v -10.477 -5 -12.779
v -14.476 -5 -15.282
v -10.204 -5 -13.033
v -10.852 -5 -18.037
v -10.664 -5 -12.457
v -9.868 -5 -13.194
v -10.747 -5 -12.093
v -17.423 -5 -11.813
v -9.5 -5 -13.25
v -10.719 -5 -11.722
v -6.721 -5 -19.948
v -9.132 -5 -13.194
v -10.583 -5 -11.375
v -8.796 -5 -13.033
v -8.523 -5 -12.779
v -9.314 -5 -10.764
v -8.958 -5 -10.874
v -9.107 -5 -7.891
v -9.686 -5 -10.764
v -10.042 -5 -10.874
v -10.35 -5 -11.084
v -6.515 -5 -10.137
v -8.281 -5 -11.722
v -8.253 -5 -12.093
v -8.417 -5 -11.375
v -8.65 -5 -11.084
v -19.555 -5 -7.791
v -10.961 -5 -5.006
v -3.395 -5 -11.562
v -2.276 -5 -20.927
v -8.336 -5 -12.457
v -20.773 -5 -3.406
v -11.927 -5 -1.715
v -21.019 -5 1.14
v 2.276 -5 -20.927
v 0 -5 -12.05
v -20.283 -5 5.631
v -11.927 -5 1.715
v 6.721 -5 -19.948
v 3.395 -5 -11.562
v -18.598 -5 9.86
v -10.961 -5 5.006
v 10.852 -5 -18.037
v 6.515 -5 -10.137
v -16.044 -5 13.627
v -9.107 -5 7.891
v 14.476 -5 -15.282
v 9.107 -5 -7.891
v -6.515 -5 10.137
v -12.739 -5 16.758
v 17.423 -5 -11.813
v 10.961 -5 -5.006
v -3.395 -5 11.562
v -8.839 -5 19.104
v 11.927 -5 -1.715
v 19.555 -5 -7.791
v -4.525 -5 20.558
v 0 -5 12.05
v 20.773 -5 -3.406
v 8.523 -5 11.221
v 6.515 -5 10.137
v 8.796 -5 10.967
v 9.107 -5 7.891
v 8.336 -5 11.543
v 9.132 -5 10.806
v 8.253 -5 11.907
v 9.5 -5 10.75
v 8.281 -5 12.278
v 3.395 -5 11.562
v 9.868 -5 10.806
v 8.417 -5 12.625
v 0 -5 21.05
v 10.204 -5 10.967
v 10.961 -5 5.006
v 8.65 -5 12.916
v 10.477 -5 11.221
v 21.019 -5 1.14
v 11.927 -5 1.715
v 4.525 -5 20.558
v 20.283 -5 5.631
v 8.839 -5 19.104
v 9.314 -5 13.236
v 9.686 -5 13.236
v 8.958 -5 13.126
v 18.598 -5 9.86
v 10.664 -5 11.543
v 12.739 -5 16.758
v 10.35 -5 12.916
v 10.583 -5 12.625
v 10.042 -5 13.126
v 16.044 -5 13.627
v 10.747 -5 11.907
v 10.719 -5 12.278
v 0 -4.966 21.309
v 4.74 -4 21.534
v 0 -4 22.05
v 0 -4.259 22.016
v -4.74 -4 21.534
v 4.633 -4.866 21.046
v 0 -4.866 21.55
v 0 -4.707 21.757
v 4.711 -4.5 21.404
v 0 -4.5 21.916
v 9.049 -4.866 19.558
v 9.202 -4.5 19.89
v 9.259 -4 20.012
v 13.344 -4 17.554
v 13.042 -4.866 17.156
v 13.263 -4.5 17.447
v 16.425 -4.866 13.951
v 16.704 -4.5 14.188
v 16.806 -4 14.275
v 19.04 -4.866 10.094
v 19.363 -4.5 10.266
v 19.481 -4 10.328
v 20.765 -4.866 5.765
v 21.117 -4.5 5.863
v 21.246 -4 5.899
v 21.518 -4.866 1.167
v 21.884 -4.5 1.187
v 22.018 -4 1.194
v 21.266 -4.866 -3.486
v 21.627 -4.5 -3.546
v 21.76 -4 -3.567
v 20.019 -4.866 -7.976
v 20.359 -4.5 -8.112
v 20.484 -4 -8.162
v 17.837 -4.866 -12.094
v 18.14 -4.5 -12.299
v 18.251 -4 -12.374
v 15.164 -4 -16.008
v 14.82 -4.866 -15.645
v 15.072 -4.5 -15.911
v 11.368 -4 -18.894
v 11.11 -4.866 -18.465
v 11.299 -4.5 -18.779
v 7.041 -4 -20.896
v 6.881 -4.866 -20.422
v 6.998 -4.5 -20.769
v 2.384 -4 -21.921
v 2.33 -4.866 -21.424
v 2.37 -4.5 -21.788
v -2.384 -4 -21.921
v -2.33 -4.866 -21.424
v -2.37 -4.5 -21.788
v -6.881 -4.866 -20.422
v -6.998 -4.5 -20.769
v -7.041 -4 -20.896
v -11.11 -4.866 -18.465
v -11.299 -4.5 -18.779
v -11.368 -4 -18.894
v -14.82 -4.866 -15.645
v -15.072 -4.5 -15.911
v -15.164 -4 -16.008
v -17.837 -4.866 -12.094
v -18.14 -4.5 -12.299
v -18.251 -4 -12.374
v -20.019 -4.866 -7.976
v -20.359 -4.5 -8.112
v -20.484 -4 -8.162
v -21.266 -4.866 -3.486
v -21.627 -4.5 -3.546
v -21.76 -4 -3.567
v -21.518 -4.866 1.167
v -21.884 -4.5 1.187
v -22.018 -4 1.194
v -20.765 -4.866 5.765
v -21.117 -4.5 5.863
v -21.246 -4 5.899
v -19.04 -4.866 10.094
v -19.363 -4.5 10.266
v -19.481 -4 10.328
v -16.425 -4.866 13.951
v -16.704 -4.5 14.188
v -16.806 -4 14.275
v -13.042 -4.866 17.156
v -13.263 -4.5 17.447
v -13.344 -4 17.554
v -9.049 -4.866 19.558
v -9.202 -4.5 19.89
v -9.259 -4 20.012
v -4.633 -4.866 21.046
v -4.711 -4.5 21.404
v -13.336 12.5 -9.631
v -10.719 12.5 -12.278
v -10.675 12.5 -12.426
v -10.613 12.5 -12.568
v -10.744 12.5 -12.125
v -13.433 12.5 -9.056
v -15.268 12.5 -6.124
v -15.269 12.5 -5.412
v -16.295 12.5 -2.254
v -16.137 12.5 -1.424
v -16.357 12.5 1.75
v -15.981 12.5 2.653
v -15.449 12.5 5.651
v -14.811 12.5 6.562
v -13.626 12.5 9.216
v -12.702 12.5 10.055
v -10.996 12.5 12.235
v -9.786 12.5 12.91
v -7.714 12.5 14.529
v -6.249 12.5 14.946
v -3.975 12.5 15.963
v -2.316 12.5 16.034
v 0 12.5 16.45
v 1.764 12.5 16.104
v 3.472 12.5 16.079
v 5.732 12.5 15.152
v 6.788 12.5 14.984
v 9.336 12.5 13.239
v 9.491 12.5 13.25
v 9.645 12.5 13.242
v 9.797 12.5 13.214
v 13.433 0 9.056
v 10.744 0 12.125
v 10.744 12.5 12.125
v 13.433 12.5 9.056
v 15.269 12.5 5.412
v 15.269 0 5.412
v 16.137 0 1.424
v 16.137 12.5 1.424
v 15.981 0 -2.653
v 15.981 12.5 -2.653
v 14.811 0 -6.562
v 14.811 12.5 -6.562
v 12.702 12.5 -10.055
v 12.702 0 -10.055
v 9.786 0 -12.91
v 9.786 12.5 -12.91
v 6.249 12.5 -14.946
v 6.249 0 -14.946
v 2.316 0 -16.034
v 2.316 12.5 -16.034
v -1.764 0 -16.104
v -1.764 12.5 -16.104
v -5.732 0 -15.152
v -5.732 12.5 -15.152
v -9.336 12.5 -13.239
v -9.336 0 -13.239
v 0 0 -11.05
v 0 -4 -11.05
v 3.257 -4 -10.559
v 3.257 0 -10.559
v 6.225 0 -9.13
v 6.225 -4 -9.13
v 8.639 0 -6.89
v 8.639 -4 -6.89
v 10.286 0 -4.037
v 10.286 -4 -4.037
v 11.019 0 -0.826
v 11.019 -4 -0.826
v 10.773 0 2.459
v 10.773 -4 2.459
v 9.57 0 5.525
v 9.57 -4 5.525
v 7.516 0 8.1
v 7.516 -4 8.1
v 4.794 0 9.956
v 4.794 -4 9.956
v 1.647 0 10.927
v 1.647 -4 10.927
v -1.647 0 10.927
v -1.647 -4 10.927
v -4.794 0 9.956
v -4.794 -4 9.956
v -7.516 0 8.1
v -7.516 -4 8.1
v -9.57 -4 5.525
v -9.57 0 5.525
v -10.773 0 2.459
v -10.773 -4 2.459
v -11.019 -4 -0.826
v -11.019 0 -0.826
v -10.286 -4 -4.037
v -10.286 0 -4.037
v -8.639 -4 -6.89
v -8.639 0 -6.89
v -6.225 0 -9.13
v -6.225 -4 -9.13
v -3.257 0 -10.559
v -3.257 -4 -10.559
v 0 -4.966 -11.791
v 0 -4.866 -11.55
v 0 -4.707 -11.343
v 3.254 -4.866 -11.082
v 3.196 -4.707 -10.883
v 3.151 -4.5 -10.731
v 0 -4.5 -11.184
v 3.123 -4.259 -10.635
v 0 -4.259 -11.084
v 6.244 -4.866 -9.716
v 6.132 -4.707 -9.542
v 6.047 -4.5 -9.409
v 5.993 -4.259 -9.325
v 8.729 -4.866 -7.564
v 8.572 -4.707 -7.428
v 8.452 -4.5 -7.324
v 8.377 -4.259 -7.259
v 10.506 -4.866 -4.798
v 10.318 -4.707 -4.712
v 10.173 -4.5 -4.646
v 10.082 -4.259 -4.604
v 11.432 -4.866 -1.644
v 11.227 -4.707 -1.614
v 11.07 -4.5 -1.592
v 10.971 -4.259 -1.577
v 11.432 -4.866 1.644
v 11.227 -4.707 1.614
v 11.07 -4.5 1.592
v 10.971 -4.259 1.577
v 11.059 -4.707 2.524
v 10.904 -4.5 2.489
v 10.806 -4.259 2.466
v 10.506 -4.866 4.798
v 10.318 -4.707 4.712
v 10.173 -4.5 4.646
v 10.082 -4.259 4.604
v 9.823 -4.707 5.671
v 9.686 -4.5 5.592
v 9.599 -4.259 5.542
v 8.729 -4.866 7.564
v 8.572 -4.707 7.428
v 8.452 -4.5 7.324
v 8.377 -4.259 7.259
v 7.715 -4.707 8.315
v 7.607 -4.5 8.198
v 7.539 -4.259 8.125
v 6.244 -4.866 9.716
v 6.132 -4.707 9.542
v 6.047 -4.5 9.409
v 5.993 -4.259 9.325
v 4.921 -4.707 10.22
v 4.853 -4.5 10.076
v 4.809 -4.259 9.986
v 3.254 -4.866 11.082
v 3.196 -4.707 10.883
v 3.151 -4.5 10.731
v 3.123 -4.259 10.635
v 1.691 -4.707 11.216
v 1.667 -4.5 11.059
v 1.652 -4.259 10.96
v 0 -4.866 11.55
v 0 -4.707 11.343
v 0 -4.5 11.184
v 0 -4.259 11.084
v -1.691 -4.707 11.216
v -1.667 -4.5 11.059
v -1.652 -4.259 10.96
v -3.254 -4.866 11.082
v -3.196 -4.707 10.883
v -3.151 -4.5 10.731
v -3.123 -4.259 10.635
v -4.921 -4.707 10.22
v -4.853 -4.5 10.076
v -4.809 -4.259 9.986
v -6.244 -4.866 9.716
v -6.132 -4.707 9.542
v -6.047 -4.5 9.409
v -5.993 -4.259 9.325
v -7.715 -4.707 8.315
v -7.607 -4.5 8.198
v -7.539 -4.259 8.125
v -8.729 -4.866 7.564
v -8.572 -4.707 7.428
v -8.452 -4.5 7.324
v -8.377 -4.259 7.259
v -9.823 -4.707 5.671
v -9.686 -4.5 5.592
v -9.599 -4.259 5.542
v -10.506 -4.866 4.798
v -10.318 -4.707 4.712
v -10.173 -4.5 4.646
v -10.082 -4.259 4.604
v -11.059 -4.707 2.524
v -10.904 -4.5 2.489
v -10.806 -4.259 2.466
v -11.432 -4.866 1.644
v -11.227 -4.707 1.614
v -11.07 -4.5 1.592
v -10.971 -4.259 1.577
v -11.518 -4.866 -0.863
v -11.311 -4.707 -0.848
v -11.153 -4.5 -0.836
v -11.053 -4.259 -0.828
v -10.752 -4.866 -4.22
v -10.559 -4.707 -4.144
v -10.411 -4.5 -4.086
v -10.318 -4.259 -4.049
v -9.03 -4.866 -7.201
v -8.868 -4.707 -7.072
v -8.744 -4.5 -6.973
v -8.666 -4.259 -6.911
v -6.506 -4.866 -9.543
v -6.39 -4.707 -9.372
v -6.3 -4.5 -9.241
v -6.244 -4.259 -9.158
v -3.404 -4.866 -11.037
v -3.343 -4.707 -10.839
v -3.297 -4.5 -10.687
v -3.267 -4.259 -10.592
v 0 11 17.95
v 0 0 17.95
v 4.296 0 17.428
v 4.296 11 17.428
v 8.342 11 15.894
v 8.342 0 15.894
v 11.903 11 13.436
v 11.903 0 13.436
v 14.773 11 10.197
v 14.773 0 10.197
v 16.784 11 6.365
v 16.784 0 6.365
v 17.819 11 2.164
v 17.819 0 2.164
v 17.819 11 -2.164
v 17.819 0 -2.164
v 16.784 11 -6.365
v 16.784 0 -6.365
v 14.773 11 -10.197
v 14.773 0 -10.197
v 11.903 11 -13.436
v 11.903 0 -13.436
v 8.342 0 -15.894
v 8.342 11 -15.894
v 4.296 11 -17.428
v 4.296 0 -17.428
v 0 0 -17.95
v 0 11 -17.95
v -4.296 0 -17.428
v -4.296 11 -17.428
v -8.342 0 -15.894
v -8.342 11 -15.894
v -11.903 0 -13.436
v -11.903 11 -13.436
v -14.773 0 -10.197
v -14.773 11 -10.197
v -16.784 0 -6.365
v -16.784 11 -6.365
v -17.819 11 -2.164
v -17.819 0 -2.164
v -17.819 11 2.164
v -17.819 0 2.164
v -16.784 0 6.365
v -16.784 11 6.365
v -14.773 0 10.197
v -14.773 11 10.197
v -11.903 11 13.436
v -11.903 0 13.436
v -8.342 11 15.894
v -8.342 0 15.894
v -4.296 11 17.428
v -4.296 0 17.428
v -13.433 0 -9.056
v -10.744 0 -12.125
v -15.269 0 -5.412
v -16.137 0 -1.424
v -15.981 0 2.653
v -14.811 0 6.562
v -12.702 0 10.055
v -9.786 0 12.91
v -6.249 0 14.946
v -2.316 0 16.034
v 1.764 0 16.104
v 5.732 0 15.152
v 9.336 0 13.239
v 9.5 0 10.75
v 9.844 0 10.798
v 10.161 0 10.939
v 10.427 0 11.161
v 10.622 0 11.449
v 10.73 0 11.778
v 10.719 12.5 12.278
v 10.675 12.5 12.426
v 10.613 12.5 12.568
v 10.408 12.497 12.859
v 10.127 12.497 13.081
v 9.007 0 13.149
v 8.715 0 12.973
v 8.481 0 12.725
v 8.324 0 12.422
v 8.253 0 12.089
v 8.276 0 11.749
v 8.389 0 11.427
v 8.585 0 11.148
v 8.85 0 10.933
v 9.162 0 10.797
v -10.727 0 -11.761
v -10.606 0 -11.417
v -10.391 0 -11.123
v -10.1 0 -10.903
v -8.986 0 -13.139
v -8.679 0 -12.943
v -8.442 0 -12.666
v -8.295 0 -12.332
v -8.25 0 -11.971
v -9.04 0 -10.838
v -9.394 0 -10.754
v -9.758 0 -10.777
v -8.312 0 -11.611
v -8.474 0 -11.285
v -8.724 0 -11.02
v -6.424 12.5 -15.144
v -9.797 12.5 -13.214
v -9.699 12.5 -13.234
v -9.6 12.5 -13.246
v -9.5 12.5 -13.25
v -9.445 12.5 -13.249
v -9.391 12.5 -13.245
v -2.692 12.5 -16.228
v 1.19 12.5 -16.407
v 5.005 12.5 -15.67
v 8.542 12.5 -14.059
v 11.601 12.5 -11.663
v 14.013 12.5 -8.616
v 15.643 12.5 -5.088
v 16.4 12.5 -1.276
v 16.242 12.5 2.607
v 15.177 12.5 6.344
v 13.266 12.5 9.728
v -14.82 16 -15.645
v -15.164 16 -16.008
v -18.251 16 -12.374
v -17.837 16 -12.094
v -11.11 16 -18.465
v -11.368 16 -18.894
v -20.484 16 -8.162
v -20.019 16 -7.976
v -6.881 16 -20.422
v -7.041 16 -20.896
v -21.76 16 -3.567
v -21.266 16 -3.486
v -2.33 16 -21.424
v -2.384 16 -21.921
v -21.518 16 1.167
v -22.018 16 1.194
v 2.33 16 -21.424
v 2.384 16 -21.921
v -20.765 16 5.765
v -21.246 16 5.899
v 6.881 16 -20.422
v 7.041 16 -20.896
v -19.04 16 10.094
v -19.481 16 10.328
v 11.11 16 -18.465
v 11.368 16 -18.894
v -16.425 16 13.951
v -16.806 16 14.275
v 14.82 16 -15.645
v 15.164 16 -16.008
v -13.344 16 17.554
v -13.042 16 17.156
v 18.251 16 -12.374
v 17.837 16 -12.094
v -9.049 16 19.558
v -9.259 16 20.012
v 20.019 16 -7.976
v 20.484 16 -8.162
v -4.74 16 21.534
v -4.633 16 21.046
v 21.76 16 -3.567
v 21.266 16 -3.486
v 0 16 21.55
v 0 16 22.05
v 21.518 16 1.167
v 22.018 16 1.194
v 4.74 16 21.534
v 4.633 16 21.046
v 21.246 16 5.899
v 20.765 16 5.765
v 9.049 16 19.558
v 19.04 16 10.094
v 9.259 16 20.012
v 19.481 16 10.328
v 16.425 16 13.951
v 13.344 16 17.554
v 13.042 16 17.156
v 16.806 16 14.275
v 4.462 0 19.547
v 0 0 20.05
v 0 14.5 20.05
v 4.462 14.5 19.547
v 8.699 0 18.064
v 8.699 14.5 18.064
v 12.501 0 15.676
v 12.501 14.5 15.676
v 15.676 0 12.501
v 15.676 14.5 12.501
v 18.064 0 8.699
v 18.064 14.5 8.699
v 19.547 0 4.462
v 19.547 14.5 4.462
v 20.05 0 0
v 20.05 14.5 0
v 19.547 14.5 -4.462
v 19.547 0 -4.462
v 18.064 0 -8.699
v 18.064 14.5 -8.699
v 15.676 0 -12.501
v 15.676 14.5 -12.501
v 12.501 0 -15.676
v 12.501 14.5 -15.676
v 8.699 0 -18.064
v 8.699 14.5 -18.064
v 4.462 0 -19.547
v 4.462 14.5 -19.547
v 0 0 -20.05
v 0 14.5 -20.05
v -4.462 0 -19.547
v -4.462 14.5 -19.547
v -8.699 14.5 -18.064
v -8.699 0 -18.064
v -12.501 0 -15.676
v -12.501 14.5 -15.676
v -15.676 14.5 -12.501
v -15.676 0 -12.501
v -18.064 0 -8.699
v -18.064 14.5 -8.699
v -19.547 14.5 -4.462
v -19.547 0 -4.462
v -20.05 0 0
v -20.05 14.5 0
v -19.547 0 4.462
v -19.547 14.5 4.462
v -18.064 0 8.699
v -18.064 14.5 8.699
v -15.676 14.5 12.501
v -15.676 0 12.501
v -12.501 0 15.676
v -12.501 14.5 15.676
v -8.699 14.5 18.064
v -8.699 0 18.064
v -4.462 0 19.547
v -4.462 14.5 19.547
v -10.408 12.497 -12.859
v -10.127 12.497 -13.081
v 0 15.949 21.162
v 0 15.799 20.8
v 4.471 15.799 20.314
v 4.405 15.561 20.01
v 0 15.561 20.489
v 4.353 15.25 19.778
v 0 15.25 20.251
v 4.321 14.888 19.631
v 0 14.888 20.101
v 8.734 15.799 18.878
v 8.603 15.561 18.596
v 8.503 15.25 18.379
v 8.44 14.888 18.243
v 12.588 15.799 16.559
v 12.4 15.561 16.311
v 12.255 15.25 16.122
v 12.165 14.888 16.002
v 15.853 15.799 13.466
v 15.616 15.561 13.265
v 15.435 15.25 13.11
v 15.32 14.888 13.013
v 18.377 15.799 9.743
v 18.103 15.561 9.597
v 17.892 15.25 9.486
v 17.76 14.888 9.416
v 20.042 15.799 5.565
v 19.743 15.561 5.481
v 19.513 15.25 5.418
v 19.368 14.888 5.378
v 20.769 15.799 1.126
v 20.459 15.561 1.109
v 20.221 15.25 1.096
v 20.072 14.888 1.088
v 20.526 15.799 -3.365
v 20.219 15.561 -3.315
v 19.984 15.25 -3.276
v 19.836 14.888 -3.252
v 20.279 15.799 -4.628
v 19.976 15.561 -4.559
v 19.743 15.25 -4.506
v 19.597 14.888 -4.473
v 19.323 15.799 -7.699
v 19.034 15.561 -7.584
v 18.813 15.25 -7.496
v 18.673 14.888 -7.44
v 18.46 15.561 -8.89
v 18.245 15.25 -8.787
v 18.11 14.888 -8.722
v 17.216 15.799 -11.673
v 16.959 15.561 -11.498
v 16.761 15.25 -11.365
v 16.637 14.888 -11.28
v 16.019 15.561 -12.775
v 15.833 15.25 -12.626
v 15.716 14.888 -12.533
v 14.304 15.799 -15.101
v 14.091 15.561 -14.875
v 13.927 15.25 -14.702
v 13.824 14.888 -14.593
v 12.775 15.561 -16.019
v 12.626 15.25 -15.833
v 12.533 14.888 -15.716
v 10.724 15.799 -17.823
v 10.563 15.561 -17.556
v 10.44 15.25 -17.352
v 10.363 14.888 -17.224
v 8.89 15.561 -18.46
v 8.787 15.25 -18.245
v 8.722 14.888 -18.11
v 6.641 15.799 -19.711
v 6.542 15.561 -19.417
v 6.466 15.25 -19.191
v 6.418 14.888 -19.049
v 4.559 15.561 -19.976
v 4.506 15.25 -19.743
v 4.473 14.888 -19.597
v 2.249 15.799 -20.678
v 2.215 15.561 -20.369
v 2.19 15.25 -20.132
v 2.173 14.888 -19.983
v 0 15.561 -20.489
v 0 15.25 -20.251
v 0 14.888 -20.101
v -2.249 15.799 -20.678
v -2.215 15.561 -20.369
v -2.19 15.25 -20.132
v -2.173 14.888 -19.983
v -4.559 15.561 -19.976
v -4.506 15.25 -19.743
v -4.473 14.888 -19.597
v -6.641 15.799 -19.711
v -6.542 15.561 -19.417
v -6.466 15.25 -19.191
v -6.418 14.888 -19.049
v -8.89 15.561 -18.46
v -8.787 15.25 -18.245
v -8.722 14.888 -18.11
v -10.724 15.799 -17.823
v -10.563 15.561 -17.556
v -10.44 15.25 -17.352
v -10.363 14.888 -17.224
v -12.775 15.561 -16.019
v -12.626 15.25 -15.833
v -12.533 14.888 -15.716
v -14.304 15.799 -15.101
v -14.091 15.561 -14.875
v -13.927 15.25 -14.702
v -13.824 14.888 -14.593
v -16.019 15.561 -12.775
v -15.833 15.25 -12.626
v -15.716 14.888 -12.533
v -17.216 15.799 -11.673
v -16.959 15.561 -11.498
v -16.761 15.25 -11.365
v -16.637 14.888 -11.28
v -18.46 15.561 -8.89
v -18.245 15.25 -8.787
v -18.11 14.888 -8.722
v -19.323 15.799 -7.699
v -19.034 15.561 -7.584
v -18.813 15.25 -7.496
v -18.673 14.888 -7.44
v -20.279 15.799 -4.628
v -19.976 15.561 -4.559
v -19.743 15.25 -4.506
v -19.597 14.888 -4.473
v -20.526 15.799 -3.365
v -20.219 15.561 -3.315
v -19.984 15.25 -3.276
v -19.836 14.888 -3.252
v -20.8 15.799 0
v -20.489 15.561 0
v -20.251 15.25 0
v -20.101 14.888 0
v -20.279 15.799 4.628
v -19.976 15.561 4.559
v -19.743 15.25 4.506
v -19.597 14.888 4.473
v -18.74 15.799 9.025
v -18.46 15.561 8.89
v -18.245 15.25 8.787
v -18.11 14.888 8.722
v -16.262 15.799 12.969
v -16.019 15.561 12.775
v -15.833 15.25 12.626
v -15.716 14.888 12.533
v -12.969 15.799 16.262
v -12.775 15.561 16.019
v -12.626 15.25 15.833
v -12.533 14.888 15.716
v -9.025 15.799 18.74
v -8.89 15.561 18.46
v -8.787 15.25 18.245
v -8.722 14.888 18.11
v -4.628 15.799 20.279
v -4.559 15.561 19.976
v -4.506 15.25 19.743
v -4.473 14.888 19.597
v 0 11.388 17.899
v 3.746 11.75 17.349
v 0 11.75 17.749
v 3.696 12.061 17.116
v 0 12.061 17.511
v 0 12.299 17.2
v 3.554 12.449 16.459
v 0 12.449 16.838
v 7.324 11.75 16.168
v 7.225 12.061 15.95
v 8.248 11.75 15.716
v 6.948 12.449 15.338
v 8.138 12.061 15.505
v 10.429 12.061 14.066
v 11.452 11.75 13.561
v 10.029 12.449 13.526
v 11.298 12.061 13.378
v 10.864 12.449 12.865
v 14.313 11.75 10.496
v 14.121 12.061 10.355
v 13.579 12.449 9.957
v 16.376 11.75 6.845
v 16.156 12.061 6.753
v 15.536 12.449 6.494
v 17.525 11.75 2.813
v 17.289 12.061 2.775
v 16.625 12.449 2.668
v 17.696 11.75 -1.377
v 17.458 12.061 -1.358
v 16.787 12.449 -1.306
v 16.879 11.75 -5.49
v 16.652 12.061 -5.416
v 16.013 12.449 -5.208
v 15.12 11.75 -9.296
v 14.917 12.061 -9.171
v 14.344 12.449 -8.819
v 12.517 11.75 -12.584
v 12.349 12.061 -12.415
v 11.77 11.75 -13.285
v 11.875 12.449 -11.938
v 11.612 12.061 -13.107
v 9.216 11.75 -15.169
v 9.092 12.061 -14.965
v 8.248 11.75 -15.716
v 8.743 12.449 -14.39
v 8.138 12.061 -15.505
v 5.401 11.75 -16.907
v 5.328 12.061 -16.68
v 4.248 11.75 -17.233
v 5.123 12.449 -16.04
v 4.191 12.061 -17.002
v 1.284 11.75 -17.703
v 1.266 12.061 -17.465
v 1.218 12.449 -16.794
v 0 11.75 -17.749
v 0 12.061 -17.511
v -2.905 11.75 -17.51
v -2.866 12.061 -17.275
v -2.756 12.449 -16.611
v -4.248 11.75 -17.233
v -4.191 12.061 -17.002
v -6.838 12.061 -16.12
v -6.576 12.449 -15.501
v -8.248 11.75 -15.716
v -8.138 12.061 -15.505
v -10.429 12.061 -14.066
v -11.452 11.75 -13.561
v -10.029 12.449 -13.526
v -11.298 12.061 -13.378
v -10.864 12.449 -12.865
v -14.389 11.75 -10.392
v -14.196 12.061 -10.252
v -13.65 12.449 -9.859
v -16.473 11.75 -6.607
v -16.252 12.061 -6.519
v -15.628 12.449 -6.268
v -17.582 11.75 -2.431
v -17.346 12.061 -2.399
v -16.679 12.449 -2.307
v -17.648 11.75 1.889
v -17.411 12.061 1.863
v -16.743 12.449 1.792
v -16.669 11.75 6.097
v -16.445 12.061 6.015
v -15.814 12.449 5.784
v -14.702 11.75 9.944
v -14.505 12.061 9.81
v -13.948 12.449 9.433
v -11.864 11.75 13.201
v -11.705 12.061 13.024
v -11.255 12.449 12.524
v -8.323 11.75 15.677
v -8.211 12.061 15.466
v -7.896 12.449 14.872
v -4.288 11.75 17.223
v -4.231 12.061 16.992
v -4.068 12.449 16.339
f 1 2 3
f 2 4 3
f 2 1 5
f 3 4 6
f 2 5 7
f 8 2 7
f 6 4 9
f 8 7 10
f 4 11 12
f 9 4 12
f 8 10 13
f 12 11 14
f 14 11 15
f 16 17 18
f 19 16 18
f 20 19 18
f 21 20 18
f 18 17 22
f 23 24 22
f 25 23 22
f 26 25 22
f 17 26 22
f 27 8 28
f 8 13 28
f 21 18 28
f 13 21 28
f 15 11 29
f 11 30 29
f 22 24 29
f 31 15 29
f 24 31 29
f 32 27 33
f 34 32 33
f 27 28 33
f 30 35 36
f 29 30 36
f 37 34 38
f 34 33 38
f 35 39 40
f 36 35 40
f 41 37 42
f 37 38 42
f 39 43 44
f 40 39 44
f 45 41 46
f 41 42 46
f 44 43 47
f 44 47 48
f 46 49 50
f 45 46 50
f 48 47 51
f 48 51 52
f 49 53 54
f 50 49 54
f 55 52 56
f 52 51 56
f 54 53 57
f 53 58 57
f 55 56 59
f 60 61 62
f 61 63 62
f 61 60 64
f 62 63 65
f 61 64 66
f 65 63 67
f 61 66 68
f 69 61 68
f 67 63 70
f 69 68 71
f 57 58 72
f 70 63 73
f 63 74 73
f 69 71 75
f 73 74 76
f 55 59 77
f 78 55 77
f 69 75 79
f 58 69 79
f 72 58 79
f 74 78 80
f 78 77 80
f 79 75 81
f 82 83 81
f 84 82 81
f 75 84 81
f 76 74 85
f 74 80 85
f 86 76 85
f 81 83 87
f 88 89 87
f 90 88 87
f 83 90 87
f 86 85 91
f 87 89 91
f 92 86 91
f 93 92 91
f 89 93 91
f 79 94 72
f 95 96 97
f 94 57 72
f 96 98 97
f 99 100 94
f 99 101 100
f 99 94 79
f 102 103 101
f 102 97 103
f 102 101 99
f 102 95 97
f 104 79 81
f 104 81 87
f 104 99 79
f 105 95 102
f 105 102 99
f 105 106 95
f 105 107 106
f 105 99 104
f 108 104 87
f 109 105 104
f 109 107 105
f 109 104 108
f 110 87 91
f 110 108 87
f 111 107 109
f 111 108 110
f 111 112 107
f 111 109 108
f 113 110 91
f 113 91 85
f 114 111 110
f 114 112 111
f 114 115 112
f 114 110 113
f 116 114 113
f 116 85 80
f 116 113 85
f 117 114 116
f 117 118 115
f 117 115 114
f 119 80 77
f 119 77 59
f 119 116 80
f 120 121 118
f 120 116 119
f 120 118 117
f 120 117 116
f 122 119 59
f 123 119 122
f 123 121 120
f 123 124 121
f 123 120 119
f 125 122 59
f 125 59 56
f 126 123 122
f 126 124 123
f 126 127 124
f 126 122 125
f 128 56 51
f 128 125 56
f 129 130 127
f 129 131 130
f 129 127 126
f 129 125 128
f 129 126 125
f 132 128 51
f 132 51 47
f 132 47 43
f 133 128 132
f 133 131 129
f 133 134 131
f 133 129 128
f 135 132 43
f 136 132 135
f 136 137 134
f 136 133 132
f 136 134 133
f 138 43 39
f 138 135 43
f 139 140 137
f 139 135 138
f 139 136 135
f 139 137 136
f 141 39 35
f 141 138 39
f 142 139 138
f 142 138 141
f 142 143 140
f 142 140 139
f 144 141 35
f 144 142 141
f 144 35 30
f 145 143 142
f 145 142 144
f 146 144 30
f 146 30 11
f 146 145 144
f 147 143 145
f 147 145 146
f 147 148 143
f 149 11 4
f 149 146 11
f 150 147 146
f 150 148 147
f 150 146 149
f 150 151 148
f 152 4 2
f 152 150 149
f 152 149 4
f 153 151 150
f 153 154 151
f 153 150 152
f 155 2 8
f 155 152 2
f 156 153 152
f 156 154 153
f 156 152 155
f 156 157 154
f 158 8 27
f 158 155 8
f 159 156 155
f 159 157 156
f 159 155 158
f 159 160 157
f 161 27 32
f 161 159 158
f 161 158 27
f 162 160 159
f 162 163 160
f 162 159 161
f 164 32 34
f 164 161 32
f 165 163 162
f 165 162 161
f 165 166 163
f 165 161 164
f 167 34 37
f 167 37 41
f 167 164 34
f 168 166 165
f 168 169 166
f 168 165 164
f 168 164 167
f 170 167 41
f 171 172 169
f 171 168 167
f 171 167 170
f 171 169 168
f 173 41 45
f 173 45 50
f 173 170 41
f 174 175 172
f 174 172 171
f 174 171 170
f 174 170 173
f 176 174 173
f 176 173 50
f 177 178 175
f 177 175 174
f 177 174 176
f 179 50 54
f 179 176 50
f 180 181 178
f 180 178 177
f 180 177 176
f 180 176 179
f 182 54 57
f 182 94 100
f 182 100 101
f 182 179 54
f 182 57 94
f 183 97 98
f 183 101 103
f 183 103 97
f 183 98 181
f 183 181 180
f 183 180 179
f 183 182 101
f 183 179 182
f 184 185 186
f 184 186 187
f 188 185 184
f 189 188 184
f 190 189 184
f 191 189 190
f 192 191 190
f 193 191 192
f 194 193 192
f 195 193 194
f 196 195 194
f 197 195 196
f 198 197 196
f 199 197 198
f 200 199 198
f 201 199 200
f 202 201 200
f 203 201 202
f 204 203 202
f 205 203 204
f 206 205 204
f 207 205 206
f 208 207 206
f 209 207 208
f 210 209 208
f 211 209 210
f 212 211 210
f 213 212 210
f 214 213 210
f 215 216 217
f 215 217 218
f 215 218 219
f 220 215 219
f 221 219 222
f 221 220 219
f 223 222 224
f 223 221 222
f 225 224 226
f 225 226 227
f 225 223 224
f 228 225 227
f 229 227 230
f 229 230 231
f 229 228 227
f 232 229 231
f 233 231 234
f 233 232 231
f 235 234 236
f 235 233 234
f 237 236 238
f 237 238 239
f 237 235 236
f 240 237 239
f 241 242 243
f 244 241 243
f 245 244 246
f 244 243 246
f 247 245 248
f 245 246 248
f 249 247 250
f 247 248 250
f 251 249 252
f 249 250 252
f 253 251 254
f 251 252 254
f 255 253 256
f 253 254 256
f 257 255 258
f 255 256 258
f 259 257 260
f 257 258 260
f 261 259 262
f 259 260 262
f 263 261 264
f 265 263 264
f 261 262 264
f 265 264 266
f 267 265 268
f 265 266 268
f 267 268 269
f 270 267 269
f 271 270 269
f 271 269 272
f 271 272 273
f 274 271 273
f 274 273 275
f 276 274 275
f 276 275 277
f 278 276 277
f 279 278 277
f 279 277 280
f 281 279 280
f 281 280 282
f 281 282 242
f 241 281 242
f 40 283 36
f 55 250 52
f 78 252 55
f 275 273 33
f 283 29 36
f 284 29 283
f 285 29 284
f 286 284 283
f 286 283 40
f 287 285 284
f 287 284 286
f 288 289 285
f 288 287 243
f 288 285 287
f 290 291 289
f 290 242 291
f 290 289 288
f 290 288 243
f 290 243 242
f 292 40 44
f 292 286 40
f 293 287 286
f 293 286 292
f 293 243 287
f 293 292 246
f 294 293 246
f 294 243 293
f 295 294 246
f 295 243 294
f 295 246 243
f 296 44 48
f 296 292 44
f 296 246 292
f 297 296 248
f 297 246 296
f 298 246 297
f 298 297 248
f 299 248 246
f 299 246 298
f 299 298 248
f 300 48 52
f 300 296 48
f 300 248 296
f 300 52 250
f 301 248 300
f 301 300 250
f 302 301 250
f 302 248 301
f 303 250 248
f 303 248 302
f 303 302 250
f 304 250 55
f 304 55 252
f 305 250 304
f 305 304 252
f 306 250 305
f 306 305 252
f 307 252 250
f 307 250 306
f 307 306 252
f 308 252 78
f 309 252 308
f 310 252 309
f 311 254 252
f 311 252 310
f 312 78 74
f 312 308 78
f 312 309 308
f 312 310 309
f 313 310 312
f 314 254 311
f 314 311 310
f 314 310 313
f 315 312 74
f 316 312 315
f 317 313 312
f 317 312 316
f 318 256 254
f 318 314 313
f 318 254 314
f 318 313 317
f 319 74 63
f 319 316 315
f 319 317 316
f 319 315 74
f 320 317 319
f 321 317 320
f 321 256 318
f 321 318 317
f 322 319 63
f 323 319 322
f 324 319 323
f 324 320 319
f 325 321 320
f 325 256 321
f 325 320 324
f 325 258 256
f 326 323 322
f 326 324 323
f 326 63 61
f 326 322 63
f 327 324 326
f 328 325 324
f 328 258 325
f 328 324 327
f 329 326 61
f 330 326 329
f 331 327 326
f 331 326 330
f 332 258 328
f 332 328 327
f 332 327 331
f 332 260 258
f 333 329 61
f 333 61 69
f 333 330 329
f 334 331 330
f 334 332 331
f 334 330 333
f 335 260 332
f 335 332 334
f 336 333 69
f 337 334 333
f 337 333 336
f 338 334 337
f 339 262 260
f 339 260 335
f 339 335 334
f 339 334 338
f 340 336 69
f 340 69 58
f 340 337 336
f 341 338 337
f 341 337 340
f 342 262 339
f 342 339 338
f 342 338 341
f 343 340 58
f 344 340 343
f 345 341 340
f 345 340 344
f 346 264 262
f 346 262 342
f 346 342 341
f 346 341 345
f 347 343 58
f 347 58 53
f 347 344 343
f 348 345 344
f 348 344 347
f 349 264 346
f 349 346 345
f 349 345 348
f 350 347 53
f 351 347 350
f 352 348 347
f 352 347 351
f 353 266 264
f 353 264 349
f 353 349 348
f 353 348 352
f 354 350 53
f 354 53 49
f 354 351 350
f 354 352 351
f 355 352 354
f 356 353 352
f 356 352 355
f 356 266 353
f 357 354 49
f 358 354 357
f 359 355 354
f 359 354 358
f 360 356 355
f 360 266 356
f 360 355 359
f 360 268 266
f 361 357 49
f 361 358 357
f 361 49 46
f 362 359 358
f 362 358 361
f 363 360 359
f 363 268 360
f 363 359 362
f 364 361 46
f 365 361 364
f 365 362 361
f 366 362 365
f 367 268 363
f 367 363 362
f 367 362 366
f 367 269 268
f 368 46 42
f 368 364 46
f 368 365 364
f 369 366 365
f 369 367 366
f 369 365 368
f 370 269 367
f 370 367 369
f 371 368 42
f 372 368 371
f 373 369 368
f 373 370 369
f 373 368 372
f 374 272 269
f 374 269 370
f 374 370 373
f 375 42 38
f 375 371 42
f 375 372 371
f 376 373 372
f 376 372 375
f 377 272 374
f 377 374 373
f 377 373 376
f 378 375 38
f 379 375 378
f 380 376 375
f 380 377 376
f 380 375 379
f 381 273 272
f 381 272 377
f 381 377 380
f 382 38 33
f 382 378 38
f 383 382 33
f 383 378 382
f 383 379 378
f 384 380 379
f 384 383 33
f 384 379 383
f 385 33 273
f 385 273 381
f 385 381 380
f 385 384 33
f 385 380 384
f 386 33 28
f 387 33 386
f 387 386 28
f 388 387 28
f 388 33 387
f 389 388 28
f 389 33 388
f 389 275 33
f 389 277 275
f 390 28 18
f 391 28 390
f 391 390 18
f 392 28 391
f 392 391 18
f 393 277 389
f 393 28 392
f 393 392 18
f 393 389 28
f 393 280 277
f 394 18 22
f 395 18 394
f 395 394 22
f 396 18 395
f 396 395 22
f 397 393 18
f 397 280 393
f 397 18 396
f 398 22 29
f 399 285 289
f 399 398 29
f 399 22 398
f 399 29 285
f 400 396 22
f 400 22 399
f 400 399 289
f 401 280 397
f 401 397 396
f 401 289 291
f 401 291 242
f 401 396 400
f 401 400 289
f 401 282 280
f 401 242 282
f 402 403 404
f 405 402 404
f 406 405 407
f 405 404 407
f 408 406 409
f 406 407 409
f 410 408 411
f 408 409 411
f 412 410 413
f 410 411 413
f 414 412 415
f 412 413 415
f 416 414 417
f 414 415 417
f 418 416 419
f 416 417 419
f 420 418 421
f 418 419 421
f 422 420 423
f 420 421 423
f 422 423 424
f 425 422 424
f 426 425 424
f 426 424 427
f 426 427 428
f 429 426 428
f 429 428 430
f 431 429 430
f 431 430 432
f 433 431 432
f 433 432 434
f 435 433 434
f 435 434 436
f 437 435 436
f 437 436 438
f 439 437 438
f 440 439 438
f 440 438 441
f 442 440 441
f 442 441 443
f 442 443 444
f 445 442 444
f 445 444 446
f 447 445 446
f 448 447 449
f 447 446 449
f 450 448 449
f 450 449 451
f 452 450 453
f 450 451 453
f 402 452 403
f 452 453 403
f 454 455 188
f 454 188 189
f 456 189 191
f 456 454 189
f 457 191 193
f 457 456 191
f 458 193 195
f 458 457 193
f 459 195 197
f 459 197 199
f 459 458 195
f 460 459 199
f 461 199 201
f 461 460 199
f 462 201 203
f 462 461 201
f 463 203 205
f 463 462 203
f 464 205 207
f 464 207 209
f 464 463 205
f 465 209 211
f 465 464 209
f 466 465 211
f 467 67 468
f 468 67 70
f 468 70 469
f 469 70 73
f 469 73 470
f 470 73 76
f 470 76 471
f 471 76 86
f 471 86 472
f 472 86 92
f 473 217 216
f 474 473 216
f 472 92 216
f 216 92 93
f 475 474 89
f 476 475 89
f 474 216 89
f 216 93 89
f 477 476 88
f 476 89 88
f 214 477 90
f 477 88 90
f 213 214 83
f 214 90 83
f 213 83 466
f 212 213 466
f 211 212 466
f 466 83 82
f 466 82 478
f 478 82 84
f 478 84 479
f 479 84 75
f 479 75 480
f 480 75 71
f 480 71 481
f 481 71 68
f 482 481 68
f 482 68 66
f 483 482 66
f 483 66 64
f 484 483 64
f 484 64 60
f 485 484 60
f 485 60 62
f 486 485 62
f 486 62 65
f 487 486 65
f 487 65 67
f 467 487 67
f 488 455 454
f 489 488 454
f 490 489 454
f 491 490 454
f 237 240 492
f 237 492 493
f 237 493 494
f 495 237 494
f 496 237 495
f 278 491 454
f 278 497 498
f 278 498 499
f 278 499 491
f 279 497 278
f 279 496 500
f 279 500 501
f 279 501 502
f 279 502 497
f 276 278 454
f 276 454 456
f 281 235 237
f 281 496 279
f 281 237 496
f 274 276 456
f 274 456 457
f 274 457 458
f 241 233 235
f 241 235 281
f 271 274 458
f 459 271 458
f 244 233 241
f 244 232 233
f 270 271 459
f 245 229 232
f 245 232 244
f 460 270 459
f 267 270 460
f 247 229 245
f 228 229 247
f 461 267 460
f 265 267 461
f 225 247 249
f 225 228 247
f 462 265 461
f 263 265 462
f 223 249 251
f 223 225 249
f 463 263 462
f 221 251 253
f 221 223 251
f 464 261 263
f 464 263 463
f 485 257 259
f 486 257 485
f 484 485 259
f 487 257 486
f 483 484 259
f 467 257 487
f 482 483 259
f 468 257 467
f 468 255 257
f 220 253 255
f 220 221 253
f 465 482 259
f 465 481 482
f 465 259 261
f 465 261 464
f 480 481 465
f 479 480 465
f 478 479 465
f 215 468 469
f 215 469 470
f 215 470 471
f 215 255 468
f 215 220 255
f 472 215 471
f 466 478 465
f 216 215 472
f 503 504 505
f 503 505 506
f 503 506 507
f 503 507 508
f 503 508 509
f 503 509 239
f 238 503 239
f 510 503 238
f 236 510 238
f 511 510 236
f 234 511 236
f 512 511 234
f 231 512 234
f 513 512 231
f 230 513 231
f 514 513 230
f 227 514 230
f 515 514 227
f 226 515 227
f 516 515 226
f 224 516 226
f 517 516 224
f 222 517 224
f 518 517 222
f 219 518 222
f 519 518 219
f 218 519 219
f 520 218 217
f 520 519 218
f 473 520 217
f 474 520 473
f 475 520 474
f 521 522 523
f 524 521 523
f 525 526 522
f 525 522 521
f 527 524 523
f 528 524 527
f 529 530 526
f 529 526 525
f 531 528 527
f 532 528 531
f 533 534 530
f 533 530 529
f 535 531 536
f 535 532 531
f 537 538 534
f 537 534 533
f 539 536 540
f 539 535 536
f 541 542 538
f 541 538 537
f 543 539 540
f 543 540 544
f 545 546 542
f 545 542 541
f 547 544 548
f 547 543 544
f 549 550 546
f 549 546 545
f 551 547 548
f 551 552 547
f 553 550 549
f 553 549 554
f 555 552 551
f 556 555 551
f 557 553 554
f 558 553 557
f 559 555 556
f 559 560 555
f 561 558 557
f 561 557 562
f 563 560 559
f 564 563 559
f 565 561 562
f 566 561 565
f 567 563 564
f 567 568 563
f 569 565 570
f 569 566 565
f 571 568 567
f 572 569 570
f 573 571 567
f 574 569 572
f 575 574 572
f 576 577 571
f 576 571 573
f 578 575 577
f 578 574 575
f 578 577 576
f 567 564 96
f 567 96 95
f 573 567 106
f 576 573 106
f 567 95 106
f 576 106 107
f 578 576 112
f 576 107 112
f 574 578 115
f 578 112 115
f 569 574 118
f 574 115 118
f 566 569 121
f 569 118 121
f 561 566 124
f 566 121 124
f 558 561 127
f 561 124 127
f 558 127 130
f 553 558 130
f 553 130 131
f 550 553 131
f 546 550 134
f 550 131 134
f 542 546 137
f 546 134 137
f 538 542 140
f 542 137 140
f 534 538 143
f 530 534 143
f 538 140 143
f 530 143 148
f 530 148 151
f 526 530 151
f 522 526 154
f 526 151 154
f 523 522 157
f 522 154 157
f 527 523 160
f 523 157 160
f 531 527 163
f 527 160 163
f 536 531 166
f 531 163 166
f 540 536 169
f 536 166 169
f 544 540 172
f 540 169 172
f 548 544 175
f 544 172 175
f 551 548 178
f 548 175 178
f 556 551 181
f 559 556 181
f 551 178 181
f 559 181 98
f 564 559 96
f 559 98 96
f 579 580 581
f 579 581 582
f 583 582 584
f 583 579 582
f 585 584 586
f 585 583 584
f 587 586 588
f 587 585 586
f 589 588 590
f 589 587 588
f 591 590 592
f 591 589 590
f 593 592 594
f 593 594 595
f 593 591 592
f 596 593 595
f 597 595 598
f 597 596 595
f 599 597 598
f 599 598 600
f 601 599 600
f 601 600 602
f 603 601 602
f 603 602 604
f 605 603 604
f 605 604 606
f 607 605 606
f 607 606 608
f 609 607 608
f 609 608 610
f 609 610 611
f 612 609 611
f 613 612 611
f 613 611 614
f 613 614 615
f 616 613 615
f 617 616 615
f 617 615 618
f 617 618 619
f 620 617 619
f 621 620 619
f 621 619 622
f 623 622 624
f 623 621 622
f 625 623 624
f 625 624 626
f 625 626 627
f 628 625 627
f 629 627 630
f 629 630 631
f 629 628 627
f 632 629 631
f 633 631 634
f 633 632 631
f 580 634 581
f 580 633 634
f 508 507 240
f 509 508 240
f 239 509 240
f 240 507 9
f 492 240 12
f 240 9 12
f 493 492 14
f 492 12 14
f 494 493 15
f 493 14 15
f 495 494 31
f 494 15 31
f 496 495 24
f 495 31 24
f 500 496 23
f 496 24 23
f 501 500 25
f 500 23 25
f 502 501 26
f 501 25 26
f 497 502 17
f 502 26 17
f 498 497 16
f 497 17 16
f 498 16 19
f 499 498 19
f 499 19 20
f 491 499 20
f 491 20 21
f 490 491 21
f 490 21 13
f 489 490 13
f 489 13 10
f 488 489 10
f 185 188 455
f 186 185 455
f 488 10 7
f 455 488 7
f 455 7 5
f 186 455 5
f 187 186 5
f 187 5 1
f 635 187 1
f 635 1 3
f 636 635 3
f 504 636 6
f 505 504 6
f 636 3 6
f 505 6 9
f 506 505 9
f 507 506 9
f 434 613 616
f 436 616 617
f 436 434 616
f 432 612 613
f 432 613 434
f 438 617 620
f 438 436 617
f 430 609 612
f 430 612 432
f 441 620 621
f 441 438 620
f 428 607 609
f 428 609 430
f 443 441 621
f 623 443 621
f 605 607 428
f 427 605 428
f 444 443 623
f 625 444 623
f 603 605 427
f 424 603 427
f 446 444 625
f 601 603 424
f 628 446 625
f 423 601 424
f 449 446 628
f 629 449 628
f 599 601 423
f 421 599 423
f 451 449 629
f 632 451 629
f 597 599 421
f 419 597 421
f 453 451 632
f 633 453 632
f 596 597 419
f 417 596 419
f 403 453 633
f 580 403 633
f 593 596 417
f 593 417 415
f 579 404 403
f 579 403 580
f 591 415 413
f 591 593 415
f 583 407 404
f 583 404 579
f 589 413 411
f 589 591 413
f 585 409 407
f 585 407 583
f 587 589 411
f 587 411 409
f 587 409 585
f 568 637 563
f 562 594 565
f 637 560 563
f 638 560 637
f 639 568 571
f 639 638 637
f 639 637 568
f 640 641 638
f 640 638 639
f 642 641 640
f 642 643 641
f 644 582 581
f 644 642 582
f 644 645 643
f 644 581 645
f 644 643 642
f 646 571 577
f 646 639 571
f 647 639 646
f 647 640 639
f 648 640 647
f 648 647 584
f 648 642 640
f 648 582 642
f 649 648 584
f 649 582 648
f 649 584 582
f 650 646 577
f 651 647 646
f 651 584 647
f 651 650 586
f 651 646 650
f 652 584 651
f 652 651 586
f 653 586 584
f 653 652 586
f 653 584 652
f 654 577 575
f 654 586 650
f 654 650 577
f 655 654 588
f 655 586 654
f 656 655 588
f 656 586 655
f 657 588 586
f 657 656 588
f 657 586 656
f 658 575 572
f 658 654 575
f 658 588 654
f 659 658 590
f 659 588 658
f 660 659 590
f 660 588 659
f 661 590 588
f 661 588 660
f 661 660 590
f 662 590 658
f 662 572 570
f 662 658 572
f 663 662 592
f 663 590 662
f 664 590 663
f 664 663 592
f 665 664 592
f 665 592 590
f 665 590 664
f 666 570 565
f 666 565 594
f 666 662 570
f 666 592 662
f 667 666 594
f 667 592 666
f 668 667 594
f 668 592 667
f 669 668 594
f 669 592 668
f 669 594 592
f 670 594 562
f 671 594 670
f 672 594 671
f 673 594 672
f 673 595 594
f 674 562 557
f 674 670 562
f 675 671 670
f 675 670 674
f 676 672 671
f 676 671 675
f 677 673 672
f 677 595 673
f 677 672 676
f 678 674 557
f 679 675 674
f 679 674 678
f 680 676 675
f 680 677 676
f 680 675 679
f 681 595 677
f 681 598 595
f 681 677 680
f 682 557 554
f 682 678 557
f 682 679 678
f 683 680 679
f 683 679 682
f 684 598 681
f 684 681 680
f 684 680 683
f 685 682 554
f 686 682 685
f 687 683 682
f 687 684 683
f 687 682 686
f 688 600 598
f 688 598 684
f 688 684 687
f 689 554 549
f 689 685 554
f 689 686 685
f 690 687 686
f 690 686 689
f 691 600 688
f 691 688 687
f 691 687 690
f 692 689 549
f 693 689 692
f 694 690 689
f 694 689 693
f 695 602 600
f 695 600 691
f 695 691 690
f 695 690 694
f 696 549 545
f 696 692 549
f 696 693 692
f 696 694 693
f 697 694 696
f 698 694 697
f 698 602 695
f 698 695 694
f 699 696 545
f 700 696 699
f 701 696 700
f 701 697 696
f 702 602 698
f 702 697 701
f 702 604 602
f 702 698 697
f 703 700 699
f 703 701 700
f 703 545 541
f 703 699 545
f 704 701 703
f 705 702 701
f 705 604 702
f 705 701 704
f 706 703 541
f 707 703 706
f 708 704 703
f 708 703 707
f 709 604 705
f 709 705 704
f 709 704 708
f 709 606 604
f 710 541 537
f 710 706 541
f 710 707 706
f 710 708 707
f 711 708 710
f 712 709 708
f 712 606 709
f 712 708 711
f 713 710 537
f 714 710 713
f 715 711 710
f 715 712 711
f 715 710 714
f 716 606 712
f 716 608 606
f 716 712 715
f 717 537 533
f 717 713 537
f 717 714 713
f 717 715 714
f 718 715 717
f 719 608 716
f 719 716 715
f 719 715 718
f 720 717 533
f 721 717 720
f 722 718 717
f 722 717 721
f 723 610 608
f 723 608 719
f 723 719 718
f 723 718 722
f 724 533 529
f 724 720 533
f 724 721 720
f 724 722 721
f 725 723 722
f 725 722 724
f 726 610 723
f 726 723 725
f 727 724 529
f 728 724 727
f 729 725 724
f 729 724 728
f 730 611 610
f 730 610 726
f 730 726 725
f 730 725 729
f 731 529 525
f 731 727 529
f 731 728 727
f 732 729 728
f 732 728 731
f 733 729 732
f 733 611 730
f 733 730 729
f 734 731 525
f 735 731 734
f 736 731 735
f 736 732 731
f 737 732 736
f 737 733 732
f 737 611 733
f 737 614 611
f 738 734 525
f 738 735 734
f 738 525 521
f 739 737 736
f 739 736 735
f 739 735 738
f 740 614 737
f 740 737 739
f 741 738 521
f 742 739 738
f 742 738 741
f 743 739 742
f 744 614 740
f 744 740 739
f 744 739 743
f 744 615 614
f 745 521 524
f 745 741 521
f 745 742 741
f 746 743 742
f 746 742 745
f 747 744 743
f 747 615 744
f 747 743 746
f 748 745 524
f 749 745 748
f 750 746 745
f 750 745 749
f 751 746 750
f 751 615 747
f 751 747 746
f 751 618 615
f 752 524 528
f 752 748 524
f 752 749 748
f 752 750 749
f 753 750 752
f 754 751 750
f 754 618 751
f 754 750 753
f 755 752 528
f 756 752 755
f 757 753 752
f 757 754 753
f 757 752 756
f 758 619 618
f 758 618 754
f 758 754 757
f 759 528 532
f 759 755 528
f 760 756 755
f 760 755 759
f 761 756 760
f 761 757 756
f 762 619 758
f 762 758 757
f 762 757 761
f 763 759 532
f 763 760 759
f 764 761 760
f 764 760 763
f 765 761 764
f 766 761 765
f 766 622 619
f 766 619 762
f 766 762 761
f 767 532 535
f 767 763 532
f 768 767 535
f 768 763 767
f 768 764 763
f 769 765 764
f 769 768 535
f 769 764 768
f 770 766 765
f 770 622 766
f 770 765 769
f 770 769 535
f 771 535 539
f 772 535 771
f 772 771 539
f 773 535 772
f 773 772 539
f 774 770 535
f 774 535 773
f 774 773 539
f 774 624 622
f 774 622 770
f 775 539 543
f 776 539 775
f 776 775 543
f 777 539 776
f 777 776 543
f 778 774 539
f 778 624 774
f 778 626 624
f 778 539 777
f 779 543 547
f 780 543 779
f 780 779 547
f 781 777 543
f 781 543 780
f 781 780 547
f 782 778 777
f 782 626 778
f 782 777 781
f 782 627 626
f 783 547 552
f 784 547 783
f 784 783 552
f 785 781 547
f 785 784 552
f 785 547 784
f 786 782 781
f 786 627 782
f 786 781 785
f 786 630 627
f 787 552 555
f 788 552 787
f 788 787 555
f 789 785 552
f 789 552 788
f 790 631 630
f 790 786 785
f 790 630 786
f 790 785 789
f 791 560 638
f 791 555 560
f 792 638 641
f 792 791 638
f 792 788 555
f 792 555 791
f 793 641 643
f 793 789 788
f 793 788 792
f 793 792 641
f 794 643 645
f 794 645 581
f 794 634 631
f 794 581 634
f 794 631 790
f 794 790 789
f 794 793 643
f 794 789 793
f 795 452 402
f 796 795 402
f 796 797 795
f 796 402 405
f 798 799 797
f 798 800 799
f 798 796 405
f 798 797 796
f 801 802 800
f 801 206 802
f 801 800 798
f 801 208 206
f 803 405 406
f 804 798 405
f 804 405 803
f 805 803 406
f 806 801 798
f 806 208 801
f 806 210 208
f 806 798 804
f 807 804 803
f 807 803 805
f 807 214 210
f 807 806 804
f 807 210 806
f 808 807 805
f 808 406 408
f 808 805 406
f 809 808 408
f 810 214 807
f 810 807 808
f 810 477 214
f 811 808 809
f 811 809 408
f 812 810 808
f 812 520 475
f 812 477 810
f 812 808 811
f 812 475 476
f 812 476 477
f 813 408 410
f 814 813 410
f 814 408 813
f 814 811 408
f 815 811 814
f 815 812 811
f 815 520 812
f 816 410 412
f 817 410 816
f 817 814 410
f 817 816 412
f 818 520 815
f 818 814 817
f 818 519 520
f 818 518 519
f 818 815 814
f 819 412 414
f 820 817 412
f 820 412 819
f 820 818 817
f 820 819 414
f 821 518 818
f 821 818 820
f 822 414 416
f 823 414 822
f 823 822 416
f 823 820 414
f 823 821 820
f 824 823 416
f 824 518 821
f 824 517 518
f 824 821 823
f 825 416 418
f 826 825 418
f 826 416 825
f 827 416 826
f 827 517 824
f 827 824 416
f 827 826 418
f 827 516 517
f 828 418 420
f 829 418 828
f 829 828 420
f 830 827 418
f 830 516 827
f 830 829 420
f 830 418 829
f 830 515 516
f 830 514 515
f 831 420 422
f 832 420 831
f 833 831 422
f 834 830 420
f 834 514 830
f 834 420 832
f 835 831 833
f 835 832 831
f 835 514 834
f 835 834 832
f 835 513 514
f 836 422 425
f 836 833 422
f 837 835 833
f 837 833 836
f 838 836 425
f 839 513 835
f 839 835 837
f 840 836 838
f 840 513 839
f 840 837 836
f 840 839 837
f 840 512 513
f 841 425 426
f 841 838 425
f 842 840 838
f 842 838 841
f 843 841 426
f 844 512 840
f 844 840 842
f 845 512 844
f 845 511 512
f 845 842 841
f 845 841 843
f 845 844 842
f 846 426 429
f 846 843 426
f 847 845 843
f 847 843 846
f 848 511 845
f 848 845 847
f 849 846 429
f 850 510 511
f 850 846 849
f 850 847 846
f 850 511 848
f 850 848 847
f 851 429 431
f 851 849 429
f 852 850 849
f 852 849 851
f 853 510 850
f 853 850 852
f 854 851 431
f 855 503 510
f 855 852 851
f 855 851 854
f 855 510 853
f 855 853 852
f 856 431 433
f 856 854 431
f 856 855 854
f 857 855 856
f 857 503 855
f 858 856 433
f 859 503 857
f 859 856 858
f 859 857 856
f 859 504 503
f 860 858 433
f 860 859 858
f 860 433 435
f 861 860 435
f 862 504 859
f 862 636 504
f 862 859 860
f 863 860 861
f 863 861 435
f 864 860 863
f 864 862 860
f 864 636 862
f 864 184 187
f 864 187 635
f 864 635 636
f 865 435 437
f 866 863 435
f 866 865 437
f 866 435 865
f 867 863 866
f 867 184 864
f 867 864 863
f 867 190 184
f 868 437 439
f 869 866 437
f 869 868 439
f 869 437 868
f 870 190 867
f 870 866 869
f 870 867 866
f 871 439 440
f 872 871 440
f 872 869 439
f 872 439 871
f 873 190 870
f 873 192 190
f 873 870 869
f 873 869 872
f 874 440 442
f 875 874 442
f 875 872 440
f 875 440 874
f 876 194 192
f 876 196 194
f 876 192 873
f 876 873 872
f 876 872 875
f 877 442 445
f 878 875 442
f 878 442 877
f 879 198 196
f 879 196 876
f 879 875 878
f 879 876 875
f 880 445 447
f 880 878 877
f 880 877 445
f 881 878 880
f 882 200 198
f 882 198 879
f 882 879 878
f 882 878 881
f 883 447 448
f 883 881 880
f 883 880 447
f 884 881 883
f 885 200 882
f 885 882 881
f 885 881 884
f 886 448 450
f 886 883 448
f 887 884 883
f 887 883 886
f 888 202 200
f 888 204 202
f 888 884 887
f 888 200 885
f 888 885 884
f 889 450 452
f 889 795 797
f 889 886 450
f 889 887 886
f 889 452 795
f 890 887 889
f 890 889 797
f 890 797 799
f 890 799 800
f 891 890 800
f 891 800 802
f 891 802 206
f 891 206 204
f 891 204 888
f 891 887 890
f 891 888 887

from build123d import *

# Parameters (mm, degrees)
CROQUIS1_R              = 22.05
CROQUIS1_R_2            = 20.05
SALIENTE_EXTRUIR1_DEPTH = 16
CROQUIS1_4_R            = 17.95
CROQUIS1_4_R_2          = 16.2
SALIENTE_EXTRUIR2_DEPTH = 12.5
SALIENTE_EXTRUIR4_START = -5
CROQUIS1_6_R            = 22.05
CROQUIS1_6_R_2          = 20.05
CROQUIS1_6_R_3          = 17.95
CROQUIS1_6_R_4          = 16.2
SALIENTE_EXTRUIR4_DEPTH = 5
CORTAR_EXTRUIR1_REACH   = 39.595
CROQUIS4_R              = 11.05
CROQUIS4_R_2            = 1.25
REDONDEO1_R             = 1
REDONDEO2_R             = 1.5
REDONDEO3_R             = 1


with BuildPart() as part:
    # Croquis1 → Saliente-Extruir1 (new body)
    with BuildSketch(Plane(origin=(0, 0, 0), x_dir=(1, 0, 0), z_dir=(0, 1, 0))):
        with Locations(Location((0, 0, 0), (0, 0, 270))):
            Circle(CROQUIS1_R)
        with Locations(Location((0, 0, 0), (0, 0, 270))):
            Circle(CROQUIS1_R_2, mode=Mode.SUBTRACT)
    extrude(amount=SALIENTE_EXTRUIR1_DEPTH)



with BuildPart() as body_2:
    # Croquis1<4> → Saliente-Extruir2 (new body)
    with BuildSketch(Plane(origin=(0, 0, 0), x_dir=(1, 0, 0), z_dir=(0, 1, 0))):
        with Locations(Location((0, 0, 0), (0, 0, 270))):
            Circle(CROQUIS1_4_R)
        with Locations(Location((0, 0, 0), (0, 0, 270))):
            Circle(CROQUIS1_4_R_2, mode=Mode.SUBTRACT)
    extrude(amount=SALIENTE_EXTRUIR2_DEPTH)


with BuildPart() as part_1:
    add(part.part)

    add(body_2.part)  # Saliente-Extruir4 merges body 2
    # Croquis1<6> → Saliente-Extruir4 (add)
    # profile 1 of 4: a face of its own
    with BuildSketch(Plane(origin=(0, 0, 0), x_dir=(1, 0, 0), z_dir=(0, 1, 0)).offset(SALIENTE_EXTRUIR4_START)):
        with Locations(Location((0, 0, 0), (0, 0, 270))):
            Circle(CROQUIS1_6_R)
        with Locations(Location((0, 0, 0), (0, 0, 270))):
            Circle(CROQUIS1_6_R_2, mode=Mode.SUBTRACT)
    # profile 2 of 4: a face of its own
    with BuildSketch(Plane(origin=(0, 0, 0), x_dir=(1, 0, 0), z_dir=(0, 1, 0)).offset(SALIENTE_EXTRUIR4_START)):
        with Locations(Location((0, 0, 0), (0, 0, 270))):
            Circle(CROQUIS1_6_R_2)
        with Locations(Location((0, 0, 0), (0, 0, 270))):
            Circle(CROQUIS1_6_R_3, mode=Mode.SUBTRACT)
    # profile 3 of 4: a face of its own
    with BuildSketch(Plane(origin=(0, 0, 0), x_dir=(1, 0, 0), z_dir=(0, 1, 0)).offset(SALIENTE_EXTRUIR4_START)):
        with Locations(Location((0, 0, 0), (0, 0, 270))):
            Circle(CROQUIS1_6_R_3)
        with Locations(Location((0, 0, 0), (0, 0, 270))):
            Circle(CROQUIS1_6_R_4, mode=Mode.SUBTRACT)
    # profile 4 of 4: a face of its own
    with BuildSketch(Plane(origin=(0, 0, 0), x_dir=(1, 0, 0), z_dir=(0, 1, 0)).offset(SALIENTE_EXTRUIR4_START)):
        with Locations(Location((0, 0, 0), (0, 0, 270))):
            Circle(CROQUIS1_6_R_4)
    extrude(amount=SALIENTE_EXTRUIR4_DEPTH)

    # Croquis4 → Cortar-Extruir1 (cut, up to next)
    with BuildSketch(Plane.XZ.offset(5), mode=Mode.PRIVATE) as cortar_extruir1_sk1:
        with Locations(Location((0, 0, 0), (0, 0, 270))):
            Circle(CROQUIS4_R)
    cortar_extruir1_tool1 = extrude(cortar_extruir1_sk1.sketch, amount=-CORTAR_EXTRUIR1_REACH, mode=Mode.PRIVATE) & part_1.part
    # Croquis4 → Cortar-Extruir1 (cut, up to next)
    with BuildSketch(Plane.XZ.offset(5), mode=Mode.PRIVATE) as cortar_extruir1_sk2:
        with Locations(Location((9.5, 12, 0), (0, 0, 270))):
            Circle(CROQUIS4_R_2)
    cortar_extruir1_tool2 = extrude(cortar_extruir1_sk2.sketch, amount=-CORTAR_EXTRUIR1_REACH, mode=Mode.PRIVATE) & part_1.part
    # Croquis4 → Cortar-Extruir1 (cut, up to next)
    with BuildSketch(Plane.XZ.offset(5), mode=Mode.PRIVATE) as cortar_extruir1_sk3:
        with Locations(Location((-9.5, -12, 0), (0, 0, 270))):
            Circle(CROQUIS4_R_2)
    cortar_extruir1_tool3 = extrude(cortar_extruir1_sk3.sketch, amount=-CORTAR_EXTRUIR1_REACH, mode=Mode.PRIVATE) & part_1.part
    add(cortar_extruir1_tool1.solids().sort_by_distance((0, -5, 0))[0], mode=Mode.SUBTRACT)
    add(cortar_extruir1_tool2.solids().sort_by_distance((9.5, -5, 12))[0], mode=Mode.SUBTRACT)
    add(cortar_extruir1_tool3.solids().sort_by_distance((-9.5, -5, -12))[0], mode=Mode.SUBTRACT)

    # Redondeo1
    redondeo1_edges = [part_1.edges().sort_by_distance(p)[0] for p in [
        (0, -5, 11.05),
    ]]
    fillet(redondeo1_edges, radius=REDONDEO1_R)

    # Redondeo2
    # the kernel refuses this fillet: 1.5 mm, written as the material it takes off along each edge
    with BuildSketch(Plane(origin=(0, 12.5, 0), x_dir=(0, 0, 1), z_dir=(-1, 0, 0))) as redondeo2_piece_1:
        with BuildLine():
            CenterArc((17.95 - REDONDEO2_R, -REDONDEO2_R), REDONDEO2_R, 0, 90)
            Line((17.95, -REDONDEO2_R), (17.95, 0))
            Line((17.95, 0), (17.95 - REDONDEO2_R, 0))
        make_face()
    revolve(axis=Axis((0, 12.5, 0), (0, 1, 0)), mode=Mode.SUBTRACT)
    with BuildSketch(Plane(origin=(0, 16, 0), x_dir=(0, 0, 1), z_dir=(-1, 0, 0))) as redondeo2_piece_2:
        with BuildLine():
            CenterArc((20.05 + REDONDEO2_R, -REDONDEO2_R), REDONDEO2_R, 90, 90)
            Line((20.05, -REDONDEO2_R), (20.05, 0))
            Line((20.05, 0), (20.05 + REDONDEO2_R, 0))
        make_face()
    revolve(axis=Axis((0, 16, 0), (0, 1, 0)), mode=Mode.SUBTRACT)

    # Redondeo3
    redondeo3_edges = [part_1.edges().sort_by_distance(p)[0] for p in [
        (0, -5, -22.05),
    ]]
    fillet(redondeo3_edges, radius=REDONDEO3_R)


solid = part_1.part
